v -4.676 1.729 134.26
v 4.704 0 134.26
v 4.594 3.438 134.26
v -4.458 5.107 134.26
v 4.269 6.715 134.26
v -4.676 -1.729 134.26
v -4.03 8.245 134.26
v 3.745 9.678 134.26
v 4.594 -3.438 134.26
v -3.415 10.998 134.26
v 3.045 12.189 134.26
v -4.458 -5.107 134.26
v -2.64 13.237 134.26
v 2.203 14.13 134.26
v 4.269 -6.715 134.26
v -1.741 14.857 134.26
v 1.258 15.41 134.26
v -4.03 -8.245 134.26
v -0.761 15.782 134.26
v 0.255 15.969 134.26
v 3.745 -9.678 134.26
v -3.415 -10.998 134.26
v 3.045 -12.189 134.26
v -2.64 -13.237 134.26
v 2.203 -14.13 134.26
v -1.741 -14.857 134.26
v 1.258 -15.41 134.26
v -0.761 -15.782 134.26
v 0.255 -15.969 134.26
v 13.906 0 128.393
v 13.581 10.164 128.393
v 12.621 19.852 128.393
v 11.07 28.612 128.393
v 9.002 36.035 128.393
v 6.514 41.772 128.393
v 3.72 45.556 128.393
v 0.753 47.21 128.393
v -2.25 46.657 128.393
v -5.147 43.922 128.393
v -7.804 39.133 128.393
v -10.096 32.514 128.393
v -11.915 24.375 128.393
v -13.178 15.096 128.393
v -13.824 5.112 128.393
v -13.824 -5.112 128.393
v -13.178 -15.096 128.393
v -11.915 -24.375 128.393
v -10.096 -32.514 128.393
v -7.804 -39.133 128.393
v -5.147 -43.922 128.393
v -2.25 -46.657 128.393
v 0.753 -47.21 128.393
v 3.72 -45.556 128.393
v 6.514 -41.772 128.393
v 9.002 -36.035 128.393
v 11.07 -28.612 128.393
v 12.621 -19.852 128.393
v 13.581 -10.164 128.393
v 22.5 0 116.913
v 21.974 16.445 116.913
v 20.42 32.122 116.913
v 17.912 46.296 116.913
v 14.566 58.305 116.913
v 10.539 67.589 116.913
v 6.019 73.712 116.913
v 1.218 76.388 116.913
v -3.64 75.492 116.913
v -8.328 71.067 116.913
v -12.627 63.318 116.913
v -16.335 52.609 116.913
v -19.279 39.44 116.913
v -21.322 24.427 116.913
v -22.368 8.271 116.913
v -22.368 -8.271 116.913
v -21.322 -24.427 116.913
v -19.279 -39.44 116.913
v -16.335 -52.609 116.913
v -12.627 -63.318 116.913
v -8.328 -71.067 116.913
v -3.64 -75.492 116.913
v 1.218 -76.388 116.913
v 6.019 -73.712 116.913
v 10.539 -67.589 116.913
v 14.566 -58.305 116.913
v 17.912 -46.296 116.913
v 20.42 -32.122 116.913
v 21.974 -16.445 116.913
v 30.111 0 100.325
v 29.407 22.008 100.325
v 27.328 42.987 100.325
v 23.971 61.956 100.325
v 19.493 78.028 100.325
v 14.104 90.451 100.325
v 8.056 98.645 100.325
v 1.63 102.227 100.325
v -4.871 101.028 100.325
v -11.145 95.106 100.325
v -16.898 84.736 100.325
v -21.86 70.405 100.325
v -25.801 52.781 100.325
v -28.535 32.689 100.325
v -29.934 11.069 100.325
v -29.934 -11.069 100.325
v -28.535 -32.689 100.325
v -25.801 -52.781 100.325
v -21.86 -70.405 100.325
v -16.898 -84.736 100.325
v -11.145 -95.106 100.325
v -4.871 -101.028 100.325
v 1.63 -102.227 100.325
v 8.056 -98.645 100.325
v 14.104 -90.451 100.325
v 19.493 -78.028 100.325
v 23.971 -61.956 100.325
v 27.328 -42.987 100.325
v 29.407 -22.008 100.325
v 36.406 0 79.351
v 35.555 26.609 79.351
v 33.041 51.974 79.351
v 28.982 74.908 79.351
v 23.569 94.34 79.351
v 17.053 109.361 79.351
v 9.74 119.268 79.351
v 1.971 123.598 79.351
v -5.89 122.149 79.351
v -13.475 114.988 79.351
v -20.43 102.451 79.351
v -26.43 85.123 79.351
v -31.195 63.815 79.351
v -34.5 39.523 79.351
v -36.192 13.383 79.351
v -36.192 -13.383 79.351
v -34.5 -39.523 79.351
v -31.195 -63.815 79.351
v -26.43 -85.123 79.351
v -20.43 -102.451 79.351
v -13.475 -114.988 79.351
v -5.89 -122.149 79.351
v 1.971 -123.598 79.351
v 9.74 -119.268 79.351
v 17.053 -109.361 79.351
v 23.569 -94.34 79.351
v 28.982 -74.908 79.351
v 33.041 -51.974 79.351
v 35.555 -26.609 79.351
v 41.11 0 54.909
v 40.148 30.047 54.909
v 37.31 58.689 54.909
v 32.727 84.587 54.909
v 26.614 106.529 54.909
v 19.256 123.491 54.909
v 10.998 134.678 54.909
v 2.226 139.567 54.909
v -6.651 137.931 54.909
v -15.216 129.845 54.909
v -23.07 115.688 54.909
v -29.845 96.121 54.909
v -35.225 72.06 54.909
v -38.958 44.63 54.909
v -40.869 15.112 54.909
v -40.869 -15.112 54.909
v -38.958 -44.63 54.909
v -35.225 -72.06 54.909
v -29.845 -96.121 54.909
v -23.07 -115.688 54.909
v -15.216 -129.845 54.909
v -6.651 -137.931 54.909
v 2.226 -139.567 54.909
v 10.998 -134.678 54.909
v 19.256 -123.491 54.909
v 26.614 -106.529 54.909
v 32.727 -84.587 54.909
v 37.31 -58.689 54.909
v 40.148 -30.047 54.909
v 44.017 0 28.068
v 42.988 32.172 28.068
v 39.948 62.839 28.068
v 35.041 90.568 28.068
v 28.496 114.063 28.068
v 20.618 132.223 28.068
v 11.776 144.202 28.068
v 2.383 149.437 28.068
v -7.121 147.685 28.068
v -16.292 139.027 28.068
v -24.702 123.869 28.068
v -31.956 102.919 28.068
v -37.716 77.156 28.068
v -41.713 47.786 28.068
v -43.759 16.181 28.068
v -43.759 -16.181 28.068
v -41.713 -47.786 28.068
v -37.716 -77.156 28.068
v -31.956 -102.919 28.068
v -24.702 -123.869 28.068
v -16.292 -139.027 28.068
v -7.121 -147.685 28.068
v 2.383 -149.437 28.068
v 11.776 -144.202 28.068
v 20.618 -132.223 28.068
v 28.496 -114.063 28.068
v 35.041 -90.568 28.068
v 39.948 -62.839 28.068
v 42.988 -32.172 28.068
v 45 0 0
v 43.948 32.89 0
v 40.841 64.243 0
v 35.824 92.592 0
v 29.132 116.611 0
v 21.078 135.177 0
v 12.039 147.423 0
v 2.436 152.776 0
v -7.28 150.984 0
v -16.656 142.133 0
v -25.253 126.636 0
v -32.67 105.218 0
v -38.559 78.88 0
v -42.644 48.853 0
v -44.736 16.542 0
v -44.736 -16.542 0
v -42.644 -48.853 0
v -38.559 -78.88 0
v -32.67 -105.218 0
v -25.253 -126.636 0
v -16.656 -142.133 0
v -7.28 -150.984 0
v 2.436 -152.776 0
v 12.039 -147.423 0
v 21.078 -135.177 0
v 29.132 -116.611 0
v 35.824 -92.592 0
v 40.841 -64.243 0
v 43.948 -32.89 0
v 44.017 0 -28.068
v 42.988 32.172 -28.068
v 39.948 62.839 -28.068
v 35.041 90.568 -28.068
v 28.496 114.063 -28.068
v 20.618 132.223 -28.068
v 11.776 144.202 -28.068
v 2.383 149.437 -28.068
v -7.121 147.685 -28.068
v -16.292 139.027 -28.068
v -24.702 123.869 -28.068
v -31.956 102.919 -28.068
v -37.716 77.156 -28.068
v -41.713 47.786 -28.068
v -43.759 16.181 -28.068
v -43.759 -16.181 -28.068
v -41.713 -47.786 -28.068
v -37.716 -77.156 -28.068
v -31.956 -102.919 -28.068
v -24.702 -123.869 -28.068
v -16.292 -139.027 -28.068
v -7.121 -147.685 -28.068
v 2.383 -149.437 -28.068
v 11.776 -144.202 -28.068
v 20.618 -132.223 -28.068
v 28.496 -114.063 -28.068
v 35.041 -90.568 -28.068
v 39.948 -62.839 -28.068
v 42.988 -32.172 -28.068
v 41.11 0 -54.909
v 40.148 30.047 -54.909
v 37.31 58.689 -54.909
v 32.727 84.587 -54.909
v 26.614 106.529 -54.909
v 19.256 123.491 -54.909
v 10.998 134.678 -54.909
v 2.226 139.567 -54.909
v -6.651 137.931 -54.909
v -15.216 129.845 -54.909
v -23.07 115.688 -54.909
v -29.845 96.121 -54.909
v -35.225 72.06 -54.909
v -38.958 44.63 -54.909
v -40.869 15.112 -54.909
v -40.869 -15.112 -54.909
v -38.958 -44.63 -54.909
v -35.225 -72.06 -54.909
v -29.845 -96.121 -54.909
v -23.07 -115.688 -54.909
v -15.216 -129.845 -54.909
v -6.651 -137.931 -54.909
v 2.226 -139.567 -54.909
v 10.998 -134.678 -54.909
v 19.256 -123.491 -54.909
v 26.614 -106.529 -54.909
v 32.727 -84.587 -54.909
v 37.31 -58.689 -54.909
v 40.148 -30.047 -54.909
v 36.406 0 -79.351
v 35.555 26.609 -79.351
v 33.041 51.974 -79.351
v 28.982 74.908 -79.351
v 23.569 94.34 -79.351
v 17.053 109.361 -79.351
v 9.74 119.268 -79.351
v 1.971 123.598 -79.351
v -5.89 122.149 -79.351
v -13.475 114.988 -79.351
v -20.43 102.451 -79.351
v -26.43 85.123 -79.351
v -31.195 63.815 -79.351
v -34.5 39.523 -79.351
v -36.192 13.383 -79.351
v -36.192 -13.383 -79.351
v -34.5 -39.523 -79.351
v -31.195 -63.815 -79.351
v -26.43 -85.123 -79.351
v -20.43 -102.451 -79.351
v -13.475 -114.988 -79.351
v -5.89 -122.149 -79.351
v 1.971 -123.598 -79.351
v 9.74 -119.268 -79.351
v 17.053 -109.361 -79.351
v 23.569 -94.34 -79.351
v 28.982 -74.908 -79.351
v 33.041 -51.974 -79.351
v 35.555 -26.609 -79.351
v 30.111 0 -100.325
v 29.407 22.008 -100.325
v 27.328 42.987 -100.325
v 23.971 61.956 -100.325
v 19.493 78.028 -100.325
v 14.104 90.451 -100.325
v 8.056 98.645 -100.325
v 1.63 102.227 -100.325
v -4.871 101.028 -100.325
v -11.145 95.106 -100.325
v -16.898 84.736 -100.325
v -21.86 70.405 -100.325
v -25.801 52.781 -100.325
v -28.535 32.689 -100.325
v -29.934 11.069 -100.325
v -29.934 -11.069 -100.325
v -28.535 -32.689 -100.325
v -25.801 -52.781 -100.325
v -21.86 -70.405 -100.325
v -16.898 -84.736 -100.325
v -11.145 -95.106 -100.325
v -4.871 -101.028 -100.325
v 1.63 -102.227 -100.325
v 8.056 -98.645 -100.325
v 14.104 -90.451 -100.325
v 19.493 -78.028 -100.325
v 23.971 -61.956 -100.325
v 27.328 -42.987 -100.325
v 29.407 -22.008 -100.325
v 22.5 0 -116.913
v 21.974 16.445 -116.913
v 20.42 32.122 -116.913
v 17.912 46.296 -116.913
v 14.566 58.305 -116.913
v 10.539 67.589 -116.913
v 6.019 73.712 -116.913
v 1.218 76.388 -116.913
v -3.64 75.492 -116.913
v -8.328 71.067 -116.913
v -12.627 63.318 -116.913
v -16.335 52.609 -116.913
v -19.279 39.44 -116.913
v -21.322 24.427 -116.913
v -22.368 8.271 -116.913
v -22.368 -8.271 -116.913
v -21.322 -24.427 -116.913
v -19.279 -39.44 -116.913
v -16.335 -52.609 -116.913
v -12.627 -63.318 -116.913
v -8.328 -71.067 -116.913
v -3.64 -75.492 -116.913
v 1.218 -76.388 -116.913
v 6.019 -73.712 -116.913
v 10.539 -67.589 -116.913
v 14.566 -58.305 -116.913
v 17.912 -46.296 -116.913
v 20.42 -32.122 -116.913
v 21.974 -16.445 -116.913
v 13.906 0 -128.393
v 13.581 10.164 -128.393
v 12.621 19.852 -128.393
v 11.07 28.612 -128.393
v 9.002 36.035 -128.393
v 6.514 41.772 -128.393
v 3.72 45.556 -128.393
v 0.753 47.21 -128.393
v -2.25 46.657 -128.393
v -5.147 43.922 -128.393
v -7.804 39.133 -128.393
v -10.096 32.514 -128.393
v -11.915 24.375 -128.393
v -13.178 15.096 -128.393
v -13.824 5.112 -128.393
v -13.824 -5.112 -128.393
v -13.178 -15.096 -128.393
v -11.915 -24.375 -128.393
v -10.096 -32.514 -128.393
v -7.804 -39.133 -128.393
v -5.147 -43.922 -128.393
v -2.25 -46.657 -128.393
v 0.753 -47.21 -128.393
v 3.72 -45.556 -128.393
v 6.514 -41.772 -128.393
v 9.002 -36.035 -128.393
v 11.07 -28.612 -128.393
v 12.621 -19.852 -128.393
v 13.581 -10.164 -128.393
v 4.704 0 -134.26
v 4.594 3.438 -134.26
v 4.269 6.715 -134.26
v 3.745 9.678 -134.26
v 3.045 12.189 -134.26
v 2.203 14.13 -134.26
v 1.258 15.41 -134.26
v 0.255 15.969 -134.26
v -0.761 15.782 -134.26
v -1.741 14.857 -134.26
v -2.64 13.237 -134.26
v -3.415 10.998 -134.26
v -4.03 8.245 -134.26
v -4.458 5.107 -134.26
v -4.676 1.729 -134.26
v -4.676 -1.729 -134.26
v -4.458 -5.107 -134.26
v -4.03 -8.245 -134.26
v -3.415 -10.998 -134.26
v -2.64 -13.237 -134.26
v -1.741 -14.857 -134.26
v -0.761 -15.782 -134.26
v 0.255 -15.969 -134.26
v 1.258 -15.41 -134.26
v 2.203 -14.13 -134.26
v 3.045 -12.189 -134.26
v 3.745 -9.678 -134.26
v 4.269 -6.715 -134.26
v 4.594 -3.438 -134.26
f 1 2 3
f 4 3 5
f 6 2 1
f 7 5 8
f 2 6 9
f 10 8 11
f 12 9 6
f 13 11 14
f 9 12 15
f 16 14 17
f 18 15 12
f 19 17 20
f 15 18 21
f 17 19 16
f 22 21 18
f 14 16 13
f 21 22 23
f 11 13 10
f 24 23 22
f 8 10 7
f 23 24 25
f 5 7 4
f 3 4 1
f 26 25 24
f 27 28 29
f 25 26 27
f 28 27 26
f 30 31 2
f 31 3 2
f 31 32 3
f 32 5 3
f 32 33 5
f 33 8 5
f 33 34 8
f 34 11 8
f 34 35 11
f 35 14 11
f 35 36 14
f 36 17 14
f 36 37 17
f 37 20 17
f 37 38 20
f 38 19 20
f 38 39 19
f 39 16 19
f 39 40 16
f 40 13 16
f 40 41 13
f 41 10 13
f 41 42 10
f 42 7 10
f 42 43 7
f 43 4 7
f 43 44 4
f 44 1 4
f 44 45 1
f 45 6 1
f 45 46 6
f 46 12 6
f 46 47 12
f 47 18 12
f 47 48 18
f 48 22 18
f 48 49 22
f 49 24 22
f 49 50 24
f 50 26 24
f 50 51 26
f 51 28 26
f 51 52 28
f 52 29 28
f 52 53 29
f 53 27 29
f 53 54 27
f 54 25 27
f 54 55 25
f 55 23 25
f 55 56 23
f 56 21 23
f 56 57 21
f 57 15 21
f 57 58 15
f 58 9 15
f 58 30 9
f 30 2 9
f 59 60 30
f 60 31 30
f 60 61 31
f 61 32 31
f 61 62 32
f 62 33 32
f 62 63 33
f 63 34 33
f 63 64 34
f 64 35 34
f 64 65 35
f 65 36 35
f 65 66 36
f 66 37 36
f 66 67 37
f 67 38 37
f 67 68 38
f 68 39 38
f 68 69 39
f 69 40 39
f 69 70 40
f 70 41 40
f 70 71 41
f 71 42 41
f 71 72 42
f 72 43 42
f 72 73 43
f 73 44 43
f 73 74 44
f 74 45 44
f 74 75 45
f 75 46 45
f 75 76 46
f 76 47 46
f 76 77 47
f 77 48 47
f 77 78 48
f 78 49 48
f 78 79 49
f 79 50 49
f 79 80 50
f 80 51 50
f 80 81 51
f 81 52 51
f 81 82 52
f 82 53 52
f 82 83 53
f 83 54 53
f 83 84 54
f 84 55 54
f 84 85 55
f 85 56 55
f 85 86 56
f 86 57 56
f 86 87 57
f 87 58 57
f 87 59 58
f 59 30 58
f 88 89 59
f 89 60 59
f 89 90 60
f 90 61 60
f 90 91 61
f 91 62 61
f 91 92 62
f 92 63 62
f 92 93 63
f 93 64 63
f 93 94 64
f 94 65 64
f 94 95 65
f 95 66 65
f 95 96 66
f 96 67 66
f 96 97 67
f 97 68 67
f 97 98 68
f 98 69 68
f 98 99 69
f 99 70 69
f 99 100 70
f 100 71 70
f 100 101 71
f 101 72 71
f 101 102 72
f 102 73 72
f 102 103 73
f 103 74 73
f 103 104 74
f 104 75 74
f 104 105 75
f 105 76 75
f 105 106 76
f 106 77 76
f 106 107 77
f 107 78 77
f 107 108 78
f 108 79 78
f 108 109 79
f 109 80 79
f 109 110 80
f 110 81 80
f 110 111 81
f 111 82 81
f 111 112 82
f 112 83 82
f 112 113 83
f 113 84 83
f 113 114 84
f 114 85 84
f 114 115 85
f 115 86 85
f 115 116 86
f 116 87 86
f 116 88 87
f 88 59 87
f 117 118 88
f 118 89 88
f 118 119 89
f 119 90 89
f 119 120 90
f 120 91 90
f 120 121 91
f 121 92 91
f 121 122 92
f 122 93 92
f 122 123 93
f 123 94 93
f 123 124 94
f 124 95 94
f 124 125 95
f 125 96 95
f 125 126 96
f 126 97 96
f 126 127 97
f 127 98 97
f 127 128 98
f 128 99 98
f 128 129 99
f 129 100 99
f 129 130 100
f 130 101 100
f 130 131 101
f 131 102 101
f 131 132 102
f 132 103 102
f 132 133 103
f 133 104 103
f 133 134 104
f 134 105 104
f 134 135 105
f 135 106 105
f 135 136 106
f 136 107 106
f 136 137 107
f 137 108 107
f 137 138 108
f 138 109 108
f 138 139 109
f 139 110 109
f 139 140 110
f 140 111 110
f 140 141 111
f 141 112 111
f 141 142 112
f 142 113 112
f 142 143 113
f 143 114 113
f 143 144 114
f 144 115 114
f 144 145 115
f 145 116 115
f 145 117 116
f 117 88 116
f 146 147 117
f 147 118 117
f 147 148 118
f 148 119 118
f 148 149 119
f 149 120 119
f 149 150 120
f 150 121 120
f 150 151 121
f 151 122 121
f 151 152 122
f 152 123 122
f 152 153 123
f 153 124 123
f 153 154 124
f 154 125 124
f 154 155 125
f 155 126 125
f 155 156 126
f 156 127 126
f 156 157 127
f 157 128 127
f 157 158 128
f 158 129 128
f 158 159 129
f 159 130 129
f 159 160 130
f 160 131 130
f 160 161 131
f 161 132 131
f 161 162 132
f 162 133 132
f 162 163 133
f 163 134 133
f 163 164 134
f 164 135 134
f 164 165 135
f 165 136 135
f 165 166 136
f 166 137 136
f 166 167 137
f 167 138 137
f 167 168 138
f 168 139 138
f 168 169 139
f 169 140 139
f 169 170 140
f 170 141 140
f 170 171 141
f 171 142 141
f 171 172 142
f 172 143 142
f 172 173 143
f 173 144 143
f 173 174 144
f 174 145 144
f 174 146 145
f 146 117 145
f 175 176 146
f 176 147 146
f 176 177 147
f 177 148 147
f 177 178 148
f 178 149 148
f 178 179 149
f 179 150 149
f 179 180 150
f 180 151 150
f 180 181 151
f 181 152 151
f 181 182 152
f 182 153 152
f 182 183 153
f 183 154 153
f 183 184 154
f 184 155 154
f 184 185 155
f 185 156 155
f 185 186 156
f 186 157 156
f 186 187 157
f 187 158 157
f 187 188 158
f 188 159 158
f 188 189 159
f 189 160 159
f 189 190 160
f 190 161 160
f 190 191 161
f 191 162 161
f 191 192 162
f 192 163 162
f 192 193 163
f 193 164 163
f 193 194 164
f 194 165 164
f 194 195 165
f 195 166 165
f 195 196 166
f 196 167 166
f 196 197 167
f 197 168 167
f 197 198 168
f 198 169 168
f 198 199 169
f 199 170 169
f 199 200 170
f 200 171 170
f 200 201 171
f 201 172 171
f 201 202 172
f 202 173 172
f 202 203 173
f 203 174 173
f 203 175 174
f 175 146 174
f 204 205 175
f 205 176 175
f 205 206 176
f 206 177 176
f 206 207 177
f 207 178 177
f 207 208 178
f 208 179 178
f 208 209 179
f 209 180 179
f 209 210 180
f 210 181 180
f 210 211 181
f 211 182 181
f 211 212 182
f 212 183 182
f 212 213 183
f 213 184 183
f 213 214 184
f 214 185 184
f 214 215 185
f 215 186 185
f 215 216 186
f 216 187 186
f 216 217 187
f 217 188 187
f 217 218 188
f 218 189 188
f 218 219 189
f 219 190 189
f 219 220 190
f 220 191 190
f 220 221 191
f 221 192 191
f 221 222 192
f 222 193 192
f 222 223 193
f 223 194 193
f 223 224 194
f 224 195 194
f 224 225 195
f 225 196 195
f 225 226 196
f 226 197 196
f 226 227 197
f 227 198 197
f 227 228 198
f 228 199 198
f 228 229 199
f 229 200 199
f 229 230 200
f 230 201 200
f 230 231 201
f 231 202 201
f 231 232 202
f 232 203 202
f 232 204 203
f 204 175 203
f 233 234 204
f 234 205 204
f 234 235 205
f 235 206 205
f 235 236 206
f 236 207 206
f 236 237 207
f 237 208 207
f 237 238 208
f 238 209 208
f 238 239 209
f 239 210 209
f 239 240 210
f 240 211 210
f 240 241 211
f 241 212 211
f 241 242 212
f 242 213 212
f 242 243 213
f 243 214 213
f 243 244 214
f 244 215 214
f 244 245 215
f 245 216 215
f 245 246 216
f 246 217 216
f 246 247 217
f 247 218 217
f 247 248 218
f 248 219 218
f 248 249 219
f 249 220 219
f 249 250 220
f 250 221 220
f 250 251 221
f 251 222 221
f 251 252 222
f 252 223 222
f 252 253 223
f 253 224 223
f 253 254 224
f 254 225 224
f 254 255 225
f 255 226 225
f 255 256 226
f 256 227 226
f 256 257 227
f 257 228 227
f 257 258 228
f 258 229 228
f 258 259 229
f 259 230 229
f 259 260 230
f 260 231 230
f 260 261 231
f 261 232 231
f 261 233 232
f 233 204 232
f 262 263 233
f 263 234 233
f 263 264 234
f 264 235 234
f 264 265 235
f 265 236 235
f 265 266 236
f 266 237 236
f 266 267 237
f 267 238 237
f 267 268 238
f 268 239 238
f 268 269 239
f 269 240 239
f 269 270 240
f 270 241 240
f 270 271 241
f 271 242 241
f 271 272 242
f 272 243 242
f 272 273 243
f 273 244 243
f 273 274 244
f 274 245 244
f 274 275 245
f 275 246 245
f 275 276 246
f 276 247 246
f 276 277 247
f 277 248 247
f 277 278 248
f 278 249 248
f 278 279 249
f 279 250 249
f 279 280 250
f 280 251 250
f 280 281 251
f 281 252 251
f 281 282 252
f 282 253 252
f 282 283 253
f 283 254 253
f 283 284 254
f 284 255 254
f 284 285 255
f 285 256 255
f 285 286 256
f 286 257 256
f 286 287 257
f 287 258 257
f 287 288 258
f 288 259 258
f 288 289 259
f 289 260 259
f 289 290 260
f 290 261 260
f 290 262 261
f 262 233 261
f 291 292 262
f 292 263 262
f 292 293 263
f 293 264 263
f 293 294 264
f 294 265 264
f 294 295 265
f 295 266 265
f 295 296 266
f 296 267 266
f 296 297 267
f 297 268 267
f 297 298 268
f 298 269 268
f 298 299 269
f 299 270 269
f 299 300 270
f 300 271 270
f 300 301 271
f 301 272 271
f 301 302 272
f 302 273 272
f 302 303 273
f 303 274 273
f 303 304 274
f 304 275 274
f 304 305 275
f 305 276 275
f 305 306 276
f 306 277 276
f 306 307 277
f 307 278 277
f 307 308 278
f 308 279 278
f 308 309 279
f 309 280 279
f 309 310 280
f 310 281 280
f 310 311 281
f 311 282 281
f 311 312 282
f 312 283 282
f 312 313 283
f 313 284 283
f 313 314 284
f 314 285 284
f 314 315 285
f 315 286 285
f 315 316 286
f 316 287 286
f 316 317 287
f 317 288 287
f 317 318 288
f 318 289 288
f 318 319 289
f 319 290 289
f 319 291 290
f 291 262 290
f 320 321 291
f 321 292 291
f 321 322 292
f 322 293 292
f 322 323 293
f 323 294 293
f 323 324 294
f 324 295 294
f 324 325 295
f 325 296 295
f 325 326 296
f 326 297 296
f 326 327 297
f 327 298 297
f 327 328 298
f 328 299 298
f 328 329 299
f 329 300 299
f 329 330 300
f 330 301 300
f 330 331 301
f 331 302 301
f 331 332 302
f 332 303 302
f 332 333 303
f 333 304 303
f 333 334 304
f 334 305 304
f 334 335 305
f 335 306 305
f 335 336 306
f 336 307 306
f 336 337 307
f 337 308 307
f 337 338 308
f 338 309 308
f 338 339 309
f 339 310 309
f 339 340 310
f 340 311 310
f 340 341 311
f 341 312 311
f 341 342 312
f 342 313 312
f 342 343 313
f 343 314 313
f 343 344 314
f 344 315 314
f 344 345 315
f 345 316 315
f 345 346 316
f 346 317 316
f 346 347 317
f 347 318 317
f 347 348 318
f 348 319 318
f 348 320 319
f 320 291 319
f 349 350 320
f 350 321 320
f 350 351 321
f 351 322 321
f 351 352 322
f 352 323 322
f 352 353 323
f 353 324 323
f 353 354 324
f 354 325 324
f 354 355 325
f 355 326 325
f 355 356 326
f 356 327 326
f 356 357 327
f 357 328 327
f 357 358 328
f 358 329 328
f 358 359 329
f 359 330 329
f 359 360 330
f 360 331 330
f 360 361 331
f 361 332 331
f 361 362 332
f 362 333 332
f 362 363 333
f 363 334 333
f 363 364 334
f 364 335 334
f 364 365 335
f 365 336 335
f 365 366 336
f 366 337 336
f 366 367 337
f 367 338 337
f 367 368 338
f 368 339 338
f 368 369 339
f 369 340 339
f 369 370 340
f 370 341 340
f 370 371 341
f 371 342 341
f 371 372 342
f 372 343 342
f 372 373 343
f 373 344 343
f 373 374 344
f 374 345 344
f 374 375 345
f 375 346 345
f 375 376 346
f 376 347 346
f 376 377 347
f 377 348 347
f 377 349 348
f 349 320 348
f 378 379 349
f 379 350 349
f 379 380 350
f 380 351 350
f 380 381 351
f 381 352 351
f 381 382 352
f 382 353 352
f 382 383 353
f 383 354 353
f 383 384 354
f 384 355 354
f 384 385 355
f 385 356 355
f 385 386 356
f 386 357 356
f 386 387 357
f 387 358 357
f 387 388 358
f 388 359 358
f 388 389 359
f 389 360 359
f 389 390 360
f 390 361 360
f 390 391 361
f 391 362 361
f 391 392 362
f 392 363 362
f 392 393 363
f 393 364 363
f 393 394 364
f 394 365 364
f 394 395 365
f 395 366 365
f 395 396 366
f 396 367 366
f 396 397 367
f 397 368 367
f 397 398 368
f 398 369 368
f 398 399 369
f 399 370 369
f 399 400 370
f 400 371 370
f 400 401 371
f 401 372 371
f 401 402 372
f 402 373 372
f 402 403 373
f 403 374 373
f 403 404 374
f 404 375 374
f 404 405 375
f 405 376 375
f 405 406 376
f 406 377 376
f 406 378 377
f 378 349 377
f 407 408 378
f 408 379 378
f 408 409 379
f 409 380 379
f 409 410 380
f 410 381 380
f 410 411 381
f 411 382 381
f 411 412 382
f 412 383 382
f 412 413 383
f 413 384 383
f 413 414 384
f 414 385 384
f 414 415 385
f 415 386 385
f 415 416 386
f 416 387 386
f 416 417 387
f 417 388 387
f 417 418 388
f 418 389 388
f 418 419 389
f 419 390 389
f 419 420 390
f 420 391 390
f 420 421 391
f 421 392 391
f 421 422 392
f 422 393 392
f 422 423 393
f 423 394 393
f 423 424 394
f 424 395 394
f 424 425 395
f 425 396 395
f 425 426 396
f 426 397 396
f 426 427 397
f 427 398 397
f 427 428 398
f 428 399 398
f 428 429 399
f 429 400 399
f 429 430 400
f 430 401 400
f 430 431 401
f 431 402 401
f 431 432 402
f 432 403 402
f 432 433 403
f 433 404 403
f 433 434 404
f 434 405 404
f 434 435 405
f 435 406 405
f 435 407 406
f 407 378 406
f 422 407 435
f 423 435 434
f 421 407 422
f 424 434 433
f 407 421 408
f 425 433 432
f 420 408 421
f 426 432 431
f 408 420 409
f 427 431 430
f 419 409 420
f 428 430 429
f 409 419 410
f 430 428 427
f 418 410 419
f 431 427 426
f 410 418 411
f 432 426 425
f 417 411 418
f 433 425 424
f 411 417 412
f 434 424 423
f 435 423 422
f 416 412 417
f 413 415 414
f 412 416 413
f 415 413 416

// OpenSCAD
// Generated by SolidPython 1.0.1 on 2020-07-29 00:46:47


scale(v = [5, 17, 15]) {
	sphere(r = 9);
}
/***********************************************
*********      SolidPython code:      **********
************************************************
 
# import packages: SolidPython
from solid import *
from solid.utils import *
from itertools import chain, combinations, permutations


class Resize:

    def __init__(self, scad_file):
        self.scad_file = scad_file
        #self.scad_file = import_scad(scad_file)
        # cone/cylinder param:
        self.r1 = 0
        self.r2 = 0
        self.h = 0
        # rectangular prism param:
        self.w = 0
        self.l = 0
        # ellipse param:
        self.r = 0

    # import OpenScad code (file name corresponds to shape)


    # classify shape + parameters
    def assign(self, param1, param2, param3):
        if self.scad_file == 'cone.scad':
            self.r1 = param1
            self.r2 = param2
            self.h = param3
        elif self.scad_file == 'cylinder.scad':
            self.r1 = param1
            self.r2 = param2
            self.h = param3
        elif self.scad_file == 'rectangularPrism.scad':
            self.h = param1
            self.l = param2
            self.w = param3
        else:
            self.r = param1
            self.h = param2

    # resize parameters
    def iterate(self):
        x = range(3, 20, 2)
        i = 1
        if self.scad_file == 'cone.scad':
            tempList = list(permutations(x, 2))
            for temp in tempList:
                param1 = temp[0]
                param2 = temp[1]
                filepath = 'produced_scad_files/' + 'cone' + str(param1) + '_' + str(param2) + '_' + '.scad'
                scad_render_to_file(cylinder(h=param1, r1=param2, r2=0), filepath)

        elif self.scad_file == 'cylinder.scad':
            tempList = list(permutations(x, 3))
            for temp in tempList:
                param1 = temp[0]
                param2 = temp[1]
                filepath = 'produced_scad_files/' + 'cylinder' + str(param1) + '_' + str(param2) + '_' + '.scad'
                scad_render_to_file(cylinder(h=param1, r1=param2, r2=param2), filepath)

        elif self.scad_file == 'rectangularPrism.scad':
            tempList = list(permutations(x, 3))
            for temp in tempList:
                param1 = temp[0]
                param2 = temp[1]
                param3 = temp[2]
                filepath = 'produced_scad_files/' + 'rectangularPrism' + str(param1) + '_' + str(param2) + '_' + str(
                    param3) + '.scad'
                scad_render_to_file(cube(size=(param1, param2, param3)), filepath)

        elif self.scad_file == 'ellipse.scad':
            tempList = list(permutations(x, 4))
            for temp in tempList:
                param1 = temp[0]
                param2 = temp[1]
                param3 = temp[2]
                param4 = temp[3]
                filepath = 'produced_scad_files/' + 'ellipse' + str(param1) + '_' + str(param2) + '_' + str(param3) + '_' + str(param4) + '.scad'
                scad_render_to_file(scale([param1, param2, param3])(sphere(r=param4)), filepath)

    def render_to_scadfile(self):
        scad_render_to_file(scad, 'example.scad') 
 
************************************************/
